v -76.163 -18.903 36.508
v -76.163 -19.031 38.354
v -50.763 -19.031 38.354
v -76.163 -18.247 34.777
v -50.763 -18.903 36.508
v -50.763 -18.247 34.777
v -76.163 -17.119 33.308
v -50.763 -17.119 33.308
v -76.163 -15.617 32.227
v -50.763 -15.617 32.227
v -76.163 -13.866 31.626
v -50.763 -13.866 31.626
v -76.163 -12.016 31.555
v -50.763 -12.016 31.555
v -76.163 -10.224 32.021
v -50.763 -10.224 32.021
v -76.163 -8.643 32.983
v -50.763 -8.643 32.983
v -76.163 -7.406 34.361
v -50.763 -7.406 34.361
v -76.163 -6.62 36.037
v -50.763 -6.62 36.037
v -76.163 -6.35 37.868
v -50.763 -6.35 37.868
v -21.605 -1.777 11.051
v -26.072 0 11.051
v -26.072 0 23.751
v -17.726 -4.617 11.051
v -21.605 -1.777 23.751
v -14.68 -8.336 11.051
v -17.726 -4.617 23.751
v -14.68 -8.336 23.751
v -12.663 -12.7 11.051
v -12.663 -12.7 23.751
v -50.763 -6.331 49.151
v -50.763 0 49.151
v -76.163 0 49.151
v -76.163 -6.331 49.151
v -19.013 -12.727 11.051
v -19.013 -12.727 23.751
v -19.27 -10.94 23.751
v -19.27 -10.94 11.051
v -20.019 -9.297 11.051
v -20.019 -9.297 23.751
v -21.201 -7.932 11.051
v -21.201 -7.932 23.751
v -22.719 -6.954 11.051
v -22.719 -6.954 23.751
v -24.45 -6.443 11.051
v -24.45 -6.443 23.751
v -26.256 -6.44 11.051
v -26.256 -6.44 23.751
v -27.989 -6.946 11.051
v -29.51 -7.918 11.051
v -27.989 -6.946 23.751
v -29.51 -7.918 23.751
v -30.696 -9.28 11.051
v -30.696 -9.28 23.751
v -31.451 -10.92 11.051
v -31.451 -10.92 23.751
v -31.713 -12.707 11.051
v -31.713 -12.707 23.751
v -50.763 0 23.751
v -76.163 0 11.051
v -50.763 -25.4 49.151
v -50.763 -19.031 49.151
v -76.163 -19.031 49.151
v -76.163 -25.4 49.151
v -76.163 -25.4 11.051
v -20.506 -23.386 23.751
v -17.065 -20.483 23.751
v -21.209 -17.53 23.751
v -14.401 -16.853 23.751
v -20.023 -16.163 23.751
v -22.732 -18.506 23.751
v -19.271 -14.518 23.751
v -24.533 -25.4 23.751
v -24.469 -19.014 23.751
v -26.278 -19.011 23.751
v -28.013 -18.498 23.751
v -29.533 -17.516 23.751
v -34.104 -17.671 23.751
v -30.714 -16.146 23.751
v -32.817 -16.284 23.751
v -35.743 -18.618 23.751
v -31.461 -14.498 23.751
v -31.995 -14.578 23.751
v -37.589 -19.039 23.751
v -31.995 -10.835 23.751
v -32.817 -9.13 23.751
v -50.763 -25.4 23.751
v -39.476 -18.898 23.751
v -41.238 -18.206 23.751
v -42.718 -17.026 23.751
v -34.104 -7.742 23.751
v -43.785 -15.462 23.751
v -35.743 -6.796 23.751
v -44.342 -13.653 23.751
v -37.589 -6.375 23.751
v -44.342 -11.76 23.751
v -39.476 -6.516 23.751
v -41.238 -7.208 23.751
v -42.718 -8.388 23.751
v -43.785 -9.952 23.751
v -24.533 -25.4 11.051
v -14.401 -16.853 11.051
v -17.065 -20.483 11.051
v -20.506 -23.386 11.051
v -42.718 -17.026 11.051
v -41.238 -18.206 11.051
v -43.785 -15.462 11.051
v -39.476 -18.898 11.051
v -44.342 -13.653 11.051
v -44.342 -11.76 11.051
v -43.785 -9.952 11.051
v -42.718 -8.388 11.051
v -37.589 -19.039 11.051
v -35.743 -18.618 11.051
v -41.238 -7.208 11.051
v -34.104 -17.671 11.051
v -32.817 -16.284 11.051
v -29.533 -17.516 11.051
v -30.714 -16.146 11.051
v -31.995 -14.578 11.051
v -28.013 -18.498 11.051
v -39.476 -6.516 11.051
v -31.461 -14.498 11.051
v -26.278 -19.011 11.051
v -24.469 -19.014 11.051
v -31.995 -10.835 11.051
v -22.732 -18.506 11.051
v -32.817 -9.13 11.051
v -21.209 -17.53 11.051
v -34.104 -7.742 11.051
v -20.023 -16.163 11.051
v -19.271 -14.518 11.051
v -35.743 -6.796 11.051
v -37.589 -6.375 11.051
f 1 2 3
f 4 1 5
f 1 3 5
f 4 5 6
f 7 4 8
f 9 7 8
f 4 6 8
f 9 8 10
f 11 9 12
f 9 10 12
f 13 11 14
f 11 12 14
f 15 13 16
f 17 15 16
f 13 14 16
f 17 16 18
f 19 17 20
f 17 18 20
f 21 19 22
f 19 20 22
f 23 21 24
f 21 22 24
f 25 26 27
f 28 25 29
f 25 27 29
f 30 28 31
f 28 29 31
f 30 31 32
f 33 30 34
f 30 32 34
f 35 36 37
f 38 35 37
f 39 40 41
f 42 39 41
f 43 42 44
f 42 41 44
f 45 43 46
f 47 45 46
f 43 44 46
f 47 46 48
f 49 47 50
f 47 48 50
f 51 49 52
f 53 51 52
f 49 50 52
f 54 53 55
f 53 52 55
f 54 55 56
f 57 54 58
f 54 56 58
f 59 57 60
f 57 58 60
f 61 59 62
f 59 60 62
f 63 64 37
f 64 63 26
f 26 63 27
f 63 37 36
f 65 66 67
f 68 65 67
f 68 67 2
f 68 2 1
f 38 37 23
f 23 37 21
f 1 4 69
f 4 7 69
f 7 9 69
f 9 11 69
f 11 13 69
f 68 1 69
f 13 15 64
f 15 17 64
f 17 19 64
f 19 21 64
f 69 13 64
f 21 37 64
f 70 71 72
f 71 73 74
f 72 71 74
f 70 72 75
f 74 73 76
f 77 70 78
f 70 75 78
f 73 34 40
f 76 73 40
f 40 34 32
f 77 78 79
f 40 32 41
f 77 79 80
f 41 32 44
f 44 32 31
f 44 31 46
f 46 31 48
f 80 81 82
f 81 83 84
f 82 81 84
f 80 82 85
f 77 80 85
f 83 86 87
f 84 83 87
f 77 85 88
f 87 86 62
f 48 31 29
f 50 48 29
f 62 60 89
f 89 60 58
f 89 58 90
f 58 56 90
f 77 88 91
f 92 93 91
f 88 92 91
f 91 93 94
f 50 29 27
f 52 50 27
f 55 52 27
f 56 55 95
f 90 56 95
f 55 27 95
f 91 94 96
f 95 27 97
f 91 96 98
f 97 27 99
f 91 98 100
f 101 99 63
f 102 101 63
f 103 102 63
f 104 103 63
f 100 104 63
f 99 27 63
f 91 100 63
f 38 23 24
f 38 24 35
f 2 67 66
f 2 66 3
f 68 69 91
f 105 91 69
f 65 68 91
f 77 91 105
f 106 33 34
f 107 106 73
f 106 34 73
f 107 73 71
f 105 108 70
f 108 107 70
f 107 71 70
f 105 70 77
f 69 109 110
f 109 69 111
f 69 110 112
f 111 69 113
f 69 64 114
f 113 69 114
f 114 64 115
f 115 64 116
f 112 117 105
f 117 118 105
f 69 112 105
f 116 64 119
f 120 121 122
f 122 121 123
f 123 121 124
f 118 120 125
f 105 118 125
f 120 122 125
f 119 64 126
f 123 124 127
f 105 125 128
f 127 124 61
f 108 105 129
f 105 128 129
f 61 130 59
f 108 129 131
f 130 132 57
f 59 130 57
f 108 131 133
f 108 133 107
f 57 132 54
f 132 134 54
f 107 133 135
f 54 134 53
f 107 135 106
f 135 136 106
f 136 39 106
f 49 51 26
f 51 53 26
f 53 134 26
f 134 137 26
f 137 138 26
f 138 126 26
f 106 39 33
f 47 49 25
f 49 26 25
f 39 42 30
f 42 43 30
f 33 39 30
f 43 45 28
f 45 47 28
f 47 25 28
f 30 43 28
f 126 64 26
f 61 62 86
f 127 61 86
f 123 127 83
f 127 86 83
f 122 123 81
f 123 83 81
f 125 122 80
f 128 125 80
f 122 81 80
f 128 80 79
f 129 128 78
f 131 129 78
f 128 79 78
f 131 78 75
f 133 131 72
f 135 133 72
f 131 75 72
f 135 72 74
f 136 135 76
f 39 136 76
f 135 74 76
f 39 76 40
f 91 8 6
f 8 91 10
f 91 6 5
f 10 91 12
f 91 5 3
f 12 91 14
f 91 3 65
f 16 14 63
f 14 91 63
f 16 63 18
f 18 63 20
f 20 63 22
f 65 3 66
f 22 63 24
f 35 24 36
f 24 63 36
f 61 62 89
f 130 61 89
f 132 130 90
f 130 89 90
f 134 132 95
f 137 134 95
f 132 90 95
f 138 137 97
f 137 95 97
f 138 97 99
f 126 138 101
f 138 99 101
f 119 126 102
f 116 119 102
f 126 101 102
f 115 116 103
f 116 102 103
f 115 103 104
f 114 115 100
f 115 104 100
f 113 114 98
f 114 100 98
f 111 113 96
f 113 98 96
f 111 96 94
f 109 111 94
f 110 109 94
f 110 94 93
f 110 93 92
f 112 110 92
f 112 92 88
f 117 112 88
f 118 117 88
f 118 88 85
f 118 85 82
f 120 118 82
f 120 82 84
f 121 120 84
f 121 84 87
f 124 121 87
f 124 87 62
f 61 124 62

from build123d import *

# Parameters (mm, degrees)
F1_DEPTH = 25.4
F3_DEPTH = 25.4
F4_R     = 6.35
F5_DEPTH = 25.4
F6_R     = 6.35
F7_DEPTH = 25.401
F9_DEPTH = 25.4


# Not quite as in the source:
# - ends of sketch curves that miss each other by under 0.0002 mm in the source are joined


with BuildPart() as f1:
    # F0 (on Front) → F1 (new body)
    with BuildSketch(Plane.XZ):
        Polygon((-76.163366437, 49.151442945), (-76.163366437, 11.051442945), (-12.663366437, 11.051442945), (-12.663366437, 23.751442945), (-50.763366437, 23.751442945), (-50.763366437, 49.151442945), align=None)
    extrude(amount=F1_DEPTH)

    # F2 (on face) → F3 (cut)
    with BuildSketch(Plane.XY.offset(23.751442945)):
        with BuildLine():
            ThreePointArc((-26.0716341436, 0), (-17.7255959226, -4.6165280857), (-12.663366437, -12.7))
            Line((-12.663366437, -12.7), (-12.663366437, 0))
            Line((-12.663366437, 0), (-26.0716341436, 0))
        make_face()
        with BuildLine():
            Line((-12.663366437, -25.4), (-12.663366437, -12.7))
            ThreePointArc((-12.663366437, -12.7), (-17.065136592, -20.482800112), (-24.5329812169, -25.4))
            Line((-24.5329812169, -25.4), (-12.663366437, -25.4))
        make_face()
    extrude(amount=-F3_DEPTH, mode=Mode.SUBTRACT)

    # F4 (on face) → F5 (cut)
    with BuildSketch(Plane.XY.offset(23.751442945)):
        with BuildLine():
            ThreePointArc((-19.0133373642, -12.7271744008), (-25.3531445932, -6.3771825813), (-31.7133046421, -12.7067888852))
            ThreePointArc((-31.7133046421, -12.7067888852), (-25.3735301351, -19.0771662202), (-19.0133373642, -12.7271744008))
        make_face()
        with Locations((-38.0633682514, -12.706788681)):
            Circle(F4_R)
    extrude(amount=-F5_DEPTH, mode=Mode.SUBTRACT)

    # F6 (on face) → F7 (cut, through all)
    with BuildSketch(Plane.YZ.offset(-50.763366437)):
        with Locations((-12.7, 37.8679819405)):
            Circle(F6_R)
    extrude(amount=-F7_DEPTH, mode=Mode.SUBTRACT)

    # F8 (on face) → F9 (cut)
    with BuildSketch(Plane.YZ.offset(-50.763366437)):
        with BuildLine():
            Line((-19.0313366339, 49.151442945), (-19.0313366339, 38.3544759569))
            ThreePointArc((-19.0313366339, 38.3544759569), (-12.456574062, 44.2133143835), (-6.35, 37.8679819405))
            Line((-6.35, 37.8679819405), (-6.3313366339, 49.151442945))
            Line((-6.3313366339, 49.151442945), (-19.0313366339, 49.151442945))
        make_face()
    extrude(amount=-F9_DEPTH, mode=Mode.SUBTRACT)


solid = f1.part
